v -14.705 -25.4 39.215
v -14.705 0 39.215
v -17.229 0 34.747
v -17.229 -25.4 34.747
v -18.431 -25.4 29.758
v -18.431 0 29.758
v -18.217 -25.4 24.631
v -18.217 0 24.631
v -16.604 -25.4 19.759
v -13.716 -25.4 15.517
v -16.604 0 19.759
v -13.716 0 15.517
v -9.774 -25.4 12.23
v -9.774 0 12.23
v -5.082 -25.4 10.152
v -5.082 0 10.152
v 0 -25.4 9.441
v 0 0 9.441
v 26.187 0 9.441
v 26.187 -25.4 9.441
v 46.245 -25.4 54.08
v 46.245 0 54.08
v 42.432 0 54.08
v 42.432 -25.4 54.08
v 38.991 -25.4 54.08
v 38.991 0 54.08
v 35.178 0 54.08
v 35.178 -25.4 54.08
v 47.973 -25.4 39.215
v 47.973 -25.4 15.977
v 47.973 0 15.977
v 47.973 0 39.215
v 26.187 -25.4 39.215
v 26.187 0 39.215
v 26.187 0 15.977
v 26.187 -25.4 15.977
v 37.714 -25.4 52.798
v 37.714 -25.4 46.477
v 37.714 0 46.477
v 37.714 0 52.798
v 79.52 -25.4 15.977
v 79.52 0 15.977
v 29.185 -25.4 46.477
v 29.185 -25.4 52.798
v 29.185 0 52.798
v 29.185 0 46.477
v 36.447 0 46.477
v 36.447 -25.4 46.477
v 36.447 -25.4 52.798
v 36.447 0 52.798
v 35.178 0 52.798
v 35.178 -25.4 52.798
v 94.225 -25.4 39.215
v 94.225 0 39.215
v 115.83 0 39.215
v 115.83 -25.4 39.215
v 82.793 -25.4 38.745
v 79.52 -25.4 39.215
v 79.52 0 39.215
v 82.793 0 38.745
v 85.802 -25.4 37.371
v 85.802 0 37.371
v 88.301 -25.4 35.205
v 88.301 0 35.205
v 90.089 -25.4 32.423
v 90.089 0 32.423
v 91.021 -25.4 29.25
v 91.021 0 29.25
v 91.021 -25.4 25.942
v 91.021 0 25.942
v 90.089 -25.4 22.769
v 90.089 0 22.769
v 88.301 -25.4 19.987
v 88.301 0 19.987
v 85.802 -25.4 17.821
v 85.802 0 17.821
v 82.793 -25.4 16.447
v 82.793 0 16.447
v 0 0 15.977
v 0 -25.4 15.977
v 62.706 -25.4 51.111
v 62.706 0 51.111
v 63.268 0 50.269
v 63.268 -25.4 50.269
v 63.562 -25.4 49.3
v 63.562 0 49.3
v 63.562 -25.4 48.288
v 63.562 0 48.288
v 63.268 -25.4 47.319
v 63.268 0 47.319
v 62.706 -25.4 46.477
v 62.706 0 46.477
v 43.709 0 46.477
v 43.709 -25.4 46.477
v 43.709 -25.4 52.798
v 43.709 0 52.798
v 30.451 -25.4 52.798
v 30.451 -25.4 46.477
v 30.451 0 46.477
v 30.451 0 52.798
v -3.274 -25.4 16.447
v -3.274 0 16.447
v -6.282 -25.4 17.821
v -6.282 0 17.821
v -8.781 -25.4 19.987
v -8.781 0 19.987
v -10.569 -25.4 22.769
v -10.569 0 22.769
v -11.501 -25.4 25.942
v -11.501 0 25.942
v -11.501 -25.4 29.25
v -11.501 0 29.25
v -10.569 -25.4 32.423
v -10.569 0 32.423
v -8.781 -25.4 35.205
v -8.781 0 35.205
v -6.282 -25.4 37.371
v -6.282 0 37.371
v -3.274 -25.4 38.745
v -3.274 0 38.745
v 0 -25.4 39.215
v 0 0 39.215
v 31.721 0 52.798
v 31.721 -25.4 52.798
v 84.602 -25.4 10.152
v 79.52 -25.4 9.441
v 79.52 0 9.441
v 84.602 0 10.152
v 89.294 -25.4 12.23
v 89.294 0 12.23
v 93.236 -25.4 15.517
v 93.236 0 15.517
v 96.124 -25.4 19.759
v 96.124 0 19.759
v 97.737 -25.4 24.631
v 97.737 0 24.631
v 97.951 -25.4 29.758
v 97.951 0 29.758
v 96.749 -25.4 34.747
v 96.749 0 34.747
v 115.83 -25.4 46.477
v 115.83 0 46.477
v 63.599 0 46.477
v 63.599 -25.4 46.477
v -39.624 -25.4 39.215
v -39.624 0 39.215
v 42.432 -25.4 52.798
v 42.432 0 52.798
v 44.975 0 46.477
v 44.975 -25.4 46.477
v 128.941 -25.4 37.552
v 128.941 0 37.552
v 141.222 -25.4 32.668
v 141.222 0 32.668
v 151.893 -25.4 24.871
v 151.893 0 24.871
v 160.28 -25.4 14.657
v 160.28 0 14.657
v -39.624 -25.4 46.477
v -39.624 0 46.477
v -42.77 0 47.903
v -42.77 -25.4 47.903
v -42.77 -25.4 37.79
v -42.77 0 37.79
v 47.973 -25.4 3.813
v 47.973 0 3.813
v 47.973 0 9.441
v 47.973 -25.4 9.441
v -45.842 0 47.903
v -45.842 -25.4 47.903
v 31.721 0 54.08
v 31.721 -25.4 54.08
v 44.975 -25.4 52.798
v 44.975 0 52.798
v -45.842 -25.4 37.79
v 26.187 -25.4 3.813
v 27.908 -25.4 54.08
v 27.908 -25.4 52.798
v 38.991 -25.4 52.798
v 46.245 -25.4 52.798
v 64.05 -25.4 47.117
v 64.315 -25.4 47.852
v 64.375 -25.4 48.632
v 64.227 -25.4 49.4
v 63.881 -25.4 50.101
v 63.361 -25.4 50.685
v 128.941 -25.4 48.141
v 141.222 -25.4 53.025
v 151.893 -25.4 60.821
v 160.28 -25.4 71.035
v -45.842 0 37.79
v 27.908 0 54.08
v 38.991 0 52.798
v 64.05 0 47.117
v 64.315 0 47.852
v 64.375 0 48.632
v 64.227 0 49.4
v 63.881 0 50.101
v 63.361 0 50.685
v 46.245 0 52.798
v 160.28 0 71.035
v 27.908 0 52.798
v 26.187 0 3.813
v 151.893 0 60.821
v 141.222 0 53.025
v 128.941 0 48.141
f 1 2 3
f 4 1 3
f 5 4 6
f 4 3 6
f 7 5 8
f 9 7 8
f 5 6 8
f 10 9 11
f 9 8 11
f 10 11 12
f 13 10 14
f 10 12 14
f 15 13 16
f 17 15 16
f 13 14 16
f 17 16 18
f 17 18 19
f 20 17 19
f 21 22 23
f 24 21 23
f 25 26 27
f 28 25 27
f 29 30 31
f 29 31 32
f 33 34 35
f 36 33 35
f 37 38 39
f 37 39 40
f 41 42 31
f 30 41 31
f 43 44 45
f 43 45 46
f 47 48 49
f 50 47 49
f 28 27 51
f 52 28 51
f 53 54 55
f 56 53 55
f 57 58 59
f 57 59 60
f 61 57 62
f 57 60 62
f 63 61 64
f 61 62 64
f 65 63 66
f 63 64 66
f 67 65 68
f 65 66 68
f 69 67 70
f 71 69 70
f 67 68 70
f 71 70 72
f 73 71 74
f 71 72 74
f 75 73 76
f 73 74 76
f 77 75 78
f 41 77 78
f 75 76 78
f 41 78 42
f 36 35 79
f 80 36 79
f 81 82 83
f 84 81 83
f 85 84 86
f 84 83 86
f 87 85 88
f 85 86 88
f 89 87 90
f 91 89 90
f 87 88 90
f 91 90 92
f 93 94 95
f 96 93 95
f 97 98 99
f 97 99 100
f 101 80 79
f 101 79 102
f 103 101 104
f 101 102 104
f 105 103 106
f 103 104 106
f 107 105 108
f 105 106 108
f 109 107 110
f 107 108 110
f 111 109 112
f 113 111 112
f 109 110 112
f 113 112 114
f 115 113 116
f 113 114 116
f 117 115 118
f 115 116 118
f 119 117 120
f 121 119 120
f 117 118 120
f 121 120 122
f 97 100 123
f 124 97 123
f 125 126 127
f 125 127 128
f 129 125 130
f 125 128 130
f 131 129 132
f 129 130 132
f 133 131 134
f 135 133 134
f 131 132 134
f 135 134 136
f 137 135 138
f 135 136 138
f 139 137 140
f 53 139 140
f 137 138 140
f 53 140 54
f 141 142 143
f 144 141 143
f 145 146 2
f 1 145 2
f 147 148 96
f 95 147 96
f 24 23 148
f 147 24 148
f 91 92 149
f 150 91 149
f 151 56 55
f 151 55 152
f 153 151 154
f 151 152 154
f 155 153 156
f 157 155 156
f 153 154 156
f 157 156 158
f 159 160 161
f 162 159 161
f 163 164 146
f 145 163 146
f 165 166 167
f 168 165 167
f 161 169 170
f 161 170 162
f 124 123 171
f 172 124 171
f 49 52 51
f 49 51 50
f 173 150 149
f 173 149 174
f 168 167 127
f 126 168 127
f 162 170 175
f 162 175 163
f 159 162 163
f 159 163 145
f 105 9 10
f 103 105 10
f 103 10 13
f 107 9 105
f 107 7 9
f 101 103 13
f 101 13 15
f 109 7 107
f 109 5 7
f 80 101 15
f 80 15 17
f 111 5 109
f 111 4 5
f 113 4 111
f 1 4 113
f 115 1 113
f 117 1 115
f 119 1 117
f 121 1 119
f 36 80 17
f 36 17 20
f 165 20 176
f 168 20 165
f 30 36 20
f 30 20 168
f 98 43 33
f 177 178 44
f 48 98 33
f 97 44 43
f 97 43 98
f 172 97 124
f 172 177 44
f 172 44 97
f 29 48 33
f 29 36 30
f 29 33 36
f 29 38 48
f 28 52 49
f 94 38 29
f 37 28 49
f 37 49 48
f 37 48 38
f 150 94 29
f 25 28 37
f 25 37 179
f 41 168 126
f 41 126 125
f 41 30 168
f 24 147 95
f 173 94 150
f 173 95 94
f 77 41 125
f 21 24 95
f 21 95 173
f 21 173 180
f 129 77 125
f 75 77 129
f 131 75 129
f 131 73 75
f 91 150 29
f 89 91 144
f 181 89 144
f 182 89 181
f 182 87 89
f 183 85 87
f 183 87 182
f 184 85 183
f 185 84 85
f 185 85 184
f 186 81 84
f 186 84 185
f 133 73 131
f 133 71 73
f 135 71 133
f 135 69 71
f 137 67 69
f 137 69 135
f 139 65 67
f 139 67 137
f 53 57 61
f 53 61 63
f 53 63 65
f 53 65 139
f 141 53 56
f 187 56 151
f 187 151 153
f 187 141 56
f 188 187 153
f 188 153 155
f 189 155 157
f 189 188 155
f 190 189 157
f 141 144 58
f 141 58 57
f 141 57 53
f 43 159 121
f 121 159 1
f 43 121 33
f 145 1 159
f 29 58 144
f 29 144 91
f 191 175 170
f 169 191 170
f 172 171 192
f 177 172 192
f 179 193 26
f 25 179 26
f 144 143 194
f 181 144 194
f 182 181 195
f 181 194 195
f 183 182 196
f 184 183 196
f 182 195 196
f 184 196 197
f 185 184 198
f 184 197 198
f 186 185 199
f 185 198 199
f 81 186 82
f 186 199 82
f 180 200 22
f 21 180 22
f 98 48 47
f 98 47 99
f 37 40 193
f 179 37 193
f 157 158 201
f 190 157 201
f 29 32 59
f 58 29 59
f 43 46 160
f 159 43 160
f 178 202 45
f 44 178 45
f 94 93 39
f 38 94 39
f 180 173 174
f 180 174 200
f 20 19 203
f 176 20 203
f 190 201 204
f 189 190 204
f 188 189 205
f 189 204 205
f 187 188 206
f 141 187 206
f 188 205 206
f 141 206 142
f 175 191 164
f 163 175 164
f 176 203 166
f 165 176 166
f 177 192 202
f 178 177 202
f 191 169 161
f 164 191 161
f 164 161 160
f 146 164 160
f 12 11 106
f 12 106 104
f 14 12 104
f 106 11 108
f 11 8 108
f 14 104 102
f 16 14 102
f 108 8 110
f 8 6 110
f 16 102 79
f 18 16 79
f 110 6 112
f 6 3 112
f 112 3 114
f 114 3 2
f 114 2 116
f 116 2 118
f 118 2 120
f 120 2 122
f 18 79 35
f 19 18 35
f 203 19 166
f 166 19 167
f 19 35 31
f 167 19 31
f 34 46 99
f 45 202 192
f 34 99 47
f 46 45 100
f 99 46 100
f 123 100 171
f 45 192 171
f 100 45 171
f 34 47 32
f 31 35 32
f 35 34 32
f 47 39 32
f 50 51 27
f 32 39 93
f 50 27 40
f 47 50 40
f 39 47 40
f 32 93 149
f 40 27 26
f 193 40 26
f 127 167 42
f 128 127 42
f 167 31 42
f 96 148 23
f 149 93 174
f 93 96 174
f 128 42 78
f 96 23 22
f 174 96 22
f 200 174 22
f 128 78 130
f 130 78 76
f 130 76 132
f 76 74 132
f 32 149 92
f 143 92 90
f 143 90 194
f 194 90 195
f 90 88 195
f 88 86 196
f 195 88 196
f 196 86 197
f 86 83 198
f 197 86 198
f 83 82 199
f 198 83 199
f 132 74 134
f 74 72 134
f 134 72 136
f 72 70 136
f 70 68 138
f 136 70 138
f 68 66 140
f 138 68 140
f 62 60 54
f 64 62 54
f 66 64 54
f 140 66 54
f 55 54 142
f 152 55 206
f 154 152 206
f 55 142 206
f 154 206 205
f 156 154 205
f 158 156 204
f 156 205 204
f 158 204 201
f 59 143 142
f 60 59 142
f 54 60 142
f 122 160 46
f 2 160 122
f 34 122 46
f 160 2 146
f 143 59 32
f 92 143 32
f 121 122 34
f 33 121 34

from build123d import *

# Parameters (mm, degrees)
F0_W     = 1.266345
F0_H     = 6.32021
F0_W_2   = 2.438912
F0_H_2   = 7.262094
F0_W_3   = 3.07266
F0_H_3   = 10.11271
F1_DEPTH = 25.4


with BuildPart() as f1:
    # F0 (on Front) → F1 (new body)
    with BuildSketch(Plane.XZ):
        with BuildLine():
            ThreePointArc((79.519914, 39.215297), (91.139261, 27.59595), (79.519914, 15.976603))
            Line((79.519914, 15.976603), (55.234976, 15.976603))
            Line((55.234976, 15.976603), (47.973033, 15.976603))
            Line((47.973033, 15.976603), (47.973033, 9.44072))
            Line((47.973033, 9.44072), (55.234976, 9.44072))
            Line((55.234976, 9.44072), (79.519914, 9.44072))
            ThreePointArc((79.519914, 9.44072), (96.123763, 19.758998), (94.224531, 39.215297))
            ThreePointArc((94.224531, 39.215297), (87.719972, 44.562904), (79.519914, 46.477391))
            Line((79.519914, 46.477391), (63.599461, 46.477391))
            Line((63.599461, 46.477391), (62.705725, 46.477391))
            Line((62.705725, 46.477391), (55.234976, 46.477391))
            Line((55.234976, 46.477391), (47.973033, 46.477391))
            Line((47.973033, 46.477391), (47.973033, 39.215297))
            Line((47.973033, 39.215297), (55.234976, 39.215297))
            Line((55.234976, 39.215297), (79.519914, 39.215297))
        make_face()
        Polygon((47.973033, 9.44072), (47.973033, 15.976603), (47.973033, 39.215297), (47.973033, 46.477391), (44.974909, 46.477391), (43.708564, 46.477391), (40.711089, 46.477391), (40.711089, 3.812549), (47.973033, 3.812549), align=None)
        with Locations((44.341736, 49.637496)):
            Rectangle(F0_W, F0_H)
        Polygon((33.449145, 3.812549), (40.711089, 3.812549), (40.711089, 46.477391), (37.713614, 46.477391), (36.447269, 46.477391), (33.449145, 46.477391), align=None)
        with BuildLine():
            ThreePointArc((62.705725, 51.111013), (63.599461, 48.794202), (62.705725, 46.477391))
            Line((62.705725, 46.477391), (63.599461, 46.477391))
            ThreePointArc((63.599461, 46.477391), (64.326918, 49.020706), (62.705725, 51.111013))
        make_face()
        Polygon((43.708564, 52.797601), (44.974909, 52.797601), (46.24451, 52.797601), (46.24451, 54.079618), (44.974909, 54.079618), (43.708564, 54.079618), (42.431599, 54.079618), (42.431599, 52.797601), align=None)
        Polygon((26.187202, 3.812549), (33.449145, 3.812549), (33.449145, 46.477391), (30.451022, 46.477391), (29.818174, 46.477391), (29.184677, 46.477391), (26.187202, 46.477391), (26.187202, 39.215297), (26.187202, 15.976603), (26.187202, 9.44072), align=None)
        with BuildLine():
            ThreePointArc((79.519914, 46.477391), (87.719972, 44.562904), (94.224531, 39.215297))
            Line((94.224531, 39.215297), (115.830371, 39.215297))
            ThreePointArc((115.830371, 39.215297), (141.221769, 32.667561), (160.280371, 14.657407))
            Line((160.280371, 14.657407), (160.280371, 39.215297))
            Line((160.280371, 39.215297), (160.280371, 42.846344))
            Line((160.280371, 42.846344), (160.280371, 46.477391))
            Line((160.280371, 46.477391), (160.280371, 57.156805))
            Line((160.280371, 57.156805), (160.280371, 71.035281))
            ThreePointArc((160.280371, 71.035281), (141.221769, 53.025126), (115.830371, 46.477391))
            Line((115.830371, 46.477391), (79.519914, 46.477391))
        make_face()
        with Locations((37.080441, 49.637496)):
            Rectangle(F0_W, F0_H)
        Polygon((36.447269, 52.797601), (37.713614, 52.797601), (38.990579, 52.797601), (38.990579, 54.079618), (37.713614, 54.079618), (36.447269, 54.079618), (35.177668, 54.079618), (35.177668, 52.797601), align=None)
        Polygon((29.818174, 46.477391), (30.451022, 46.477391), (30.451022, 52.797601), (29.184677, 52.797601), (29.184677, 46.477391), align=None)
        with BuildLine():
            Line((0, 9.44072), (26.187202, 9.44072))
            Line((26.187202, 9.44072), (26.187202, 15.976603))
            Line((26.187202, 15.976603), (0, 15.976603))
            ThreePointArc((0, 15.976603), (-11.619347, 27.59595), (0, 39.215297))
            Line((0, 39.215297), (26.187202, 39.215297))
            Line((26.187202, 39.215297), (26.187202, 46.477391))
            Line((26.187202, 46.477391), (0, 46.477391))
            ThreePointArc((0, 46.477391), (-8.200058, 44.562904), (-14.704617, 39.215297))
            ThreePointArc((-14.704617, 39.215297), (-16.603849, 19.758998), (0, 9.44072))
        make_face()
        Polygon((29.184677, 52.797601), (30.451022, 52.797601), (31.720623, 52.797601), (31.720623, 54.079618), (30.451022, 54.079618), (29.184677, 54.079618), (27.907712, 54.079618), (27.907712, 52.797601), align=None)
        with BuildLine():
            Line((-37.184769, 39.215297), (-14.704617, 39.215297))
            ThreePointArc((-14.704617, 39.215297), (-8.200058, 44.562904), (0, 46.477391))
            Line((0, 46.477391), (-37.184769, 46.477391))
            Line((-37.184769, 46.477391), (-37.184769, 39.215297))
        make_face()
        with Locations((-38.404225, 42.846344)):
            Rectangle(F0_W_2, F0_H_2)
        Polygon((-42.769502, 37.789989), (-39.623681, 39.215297), (-39.623681, 46.477391), (-42.769502, 47.902699), align=None)
        with Locations((-44.305832, 42.846344)):
            Rectangle(F0_W_3, F0_H_3)
    extrude(amount=F1_DEPTH)


solid = f1.part
